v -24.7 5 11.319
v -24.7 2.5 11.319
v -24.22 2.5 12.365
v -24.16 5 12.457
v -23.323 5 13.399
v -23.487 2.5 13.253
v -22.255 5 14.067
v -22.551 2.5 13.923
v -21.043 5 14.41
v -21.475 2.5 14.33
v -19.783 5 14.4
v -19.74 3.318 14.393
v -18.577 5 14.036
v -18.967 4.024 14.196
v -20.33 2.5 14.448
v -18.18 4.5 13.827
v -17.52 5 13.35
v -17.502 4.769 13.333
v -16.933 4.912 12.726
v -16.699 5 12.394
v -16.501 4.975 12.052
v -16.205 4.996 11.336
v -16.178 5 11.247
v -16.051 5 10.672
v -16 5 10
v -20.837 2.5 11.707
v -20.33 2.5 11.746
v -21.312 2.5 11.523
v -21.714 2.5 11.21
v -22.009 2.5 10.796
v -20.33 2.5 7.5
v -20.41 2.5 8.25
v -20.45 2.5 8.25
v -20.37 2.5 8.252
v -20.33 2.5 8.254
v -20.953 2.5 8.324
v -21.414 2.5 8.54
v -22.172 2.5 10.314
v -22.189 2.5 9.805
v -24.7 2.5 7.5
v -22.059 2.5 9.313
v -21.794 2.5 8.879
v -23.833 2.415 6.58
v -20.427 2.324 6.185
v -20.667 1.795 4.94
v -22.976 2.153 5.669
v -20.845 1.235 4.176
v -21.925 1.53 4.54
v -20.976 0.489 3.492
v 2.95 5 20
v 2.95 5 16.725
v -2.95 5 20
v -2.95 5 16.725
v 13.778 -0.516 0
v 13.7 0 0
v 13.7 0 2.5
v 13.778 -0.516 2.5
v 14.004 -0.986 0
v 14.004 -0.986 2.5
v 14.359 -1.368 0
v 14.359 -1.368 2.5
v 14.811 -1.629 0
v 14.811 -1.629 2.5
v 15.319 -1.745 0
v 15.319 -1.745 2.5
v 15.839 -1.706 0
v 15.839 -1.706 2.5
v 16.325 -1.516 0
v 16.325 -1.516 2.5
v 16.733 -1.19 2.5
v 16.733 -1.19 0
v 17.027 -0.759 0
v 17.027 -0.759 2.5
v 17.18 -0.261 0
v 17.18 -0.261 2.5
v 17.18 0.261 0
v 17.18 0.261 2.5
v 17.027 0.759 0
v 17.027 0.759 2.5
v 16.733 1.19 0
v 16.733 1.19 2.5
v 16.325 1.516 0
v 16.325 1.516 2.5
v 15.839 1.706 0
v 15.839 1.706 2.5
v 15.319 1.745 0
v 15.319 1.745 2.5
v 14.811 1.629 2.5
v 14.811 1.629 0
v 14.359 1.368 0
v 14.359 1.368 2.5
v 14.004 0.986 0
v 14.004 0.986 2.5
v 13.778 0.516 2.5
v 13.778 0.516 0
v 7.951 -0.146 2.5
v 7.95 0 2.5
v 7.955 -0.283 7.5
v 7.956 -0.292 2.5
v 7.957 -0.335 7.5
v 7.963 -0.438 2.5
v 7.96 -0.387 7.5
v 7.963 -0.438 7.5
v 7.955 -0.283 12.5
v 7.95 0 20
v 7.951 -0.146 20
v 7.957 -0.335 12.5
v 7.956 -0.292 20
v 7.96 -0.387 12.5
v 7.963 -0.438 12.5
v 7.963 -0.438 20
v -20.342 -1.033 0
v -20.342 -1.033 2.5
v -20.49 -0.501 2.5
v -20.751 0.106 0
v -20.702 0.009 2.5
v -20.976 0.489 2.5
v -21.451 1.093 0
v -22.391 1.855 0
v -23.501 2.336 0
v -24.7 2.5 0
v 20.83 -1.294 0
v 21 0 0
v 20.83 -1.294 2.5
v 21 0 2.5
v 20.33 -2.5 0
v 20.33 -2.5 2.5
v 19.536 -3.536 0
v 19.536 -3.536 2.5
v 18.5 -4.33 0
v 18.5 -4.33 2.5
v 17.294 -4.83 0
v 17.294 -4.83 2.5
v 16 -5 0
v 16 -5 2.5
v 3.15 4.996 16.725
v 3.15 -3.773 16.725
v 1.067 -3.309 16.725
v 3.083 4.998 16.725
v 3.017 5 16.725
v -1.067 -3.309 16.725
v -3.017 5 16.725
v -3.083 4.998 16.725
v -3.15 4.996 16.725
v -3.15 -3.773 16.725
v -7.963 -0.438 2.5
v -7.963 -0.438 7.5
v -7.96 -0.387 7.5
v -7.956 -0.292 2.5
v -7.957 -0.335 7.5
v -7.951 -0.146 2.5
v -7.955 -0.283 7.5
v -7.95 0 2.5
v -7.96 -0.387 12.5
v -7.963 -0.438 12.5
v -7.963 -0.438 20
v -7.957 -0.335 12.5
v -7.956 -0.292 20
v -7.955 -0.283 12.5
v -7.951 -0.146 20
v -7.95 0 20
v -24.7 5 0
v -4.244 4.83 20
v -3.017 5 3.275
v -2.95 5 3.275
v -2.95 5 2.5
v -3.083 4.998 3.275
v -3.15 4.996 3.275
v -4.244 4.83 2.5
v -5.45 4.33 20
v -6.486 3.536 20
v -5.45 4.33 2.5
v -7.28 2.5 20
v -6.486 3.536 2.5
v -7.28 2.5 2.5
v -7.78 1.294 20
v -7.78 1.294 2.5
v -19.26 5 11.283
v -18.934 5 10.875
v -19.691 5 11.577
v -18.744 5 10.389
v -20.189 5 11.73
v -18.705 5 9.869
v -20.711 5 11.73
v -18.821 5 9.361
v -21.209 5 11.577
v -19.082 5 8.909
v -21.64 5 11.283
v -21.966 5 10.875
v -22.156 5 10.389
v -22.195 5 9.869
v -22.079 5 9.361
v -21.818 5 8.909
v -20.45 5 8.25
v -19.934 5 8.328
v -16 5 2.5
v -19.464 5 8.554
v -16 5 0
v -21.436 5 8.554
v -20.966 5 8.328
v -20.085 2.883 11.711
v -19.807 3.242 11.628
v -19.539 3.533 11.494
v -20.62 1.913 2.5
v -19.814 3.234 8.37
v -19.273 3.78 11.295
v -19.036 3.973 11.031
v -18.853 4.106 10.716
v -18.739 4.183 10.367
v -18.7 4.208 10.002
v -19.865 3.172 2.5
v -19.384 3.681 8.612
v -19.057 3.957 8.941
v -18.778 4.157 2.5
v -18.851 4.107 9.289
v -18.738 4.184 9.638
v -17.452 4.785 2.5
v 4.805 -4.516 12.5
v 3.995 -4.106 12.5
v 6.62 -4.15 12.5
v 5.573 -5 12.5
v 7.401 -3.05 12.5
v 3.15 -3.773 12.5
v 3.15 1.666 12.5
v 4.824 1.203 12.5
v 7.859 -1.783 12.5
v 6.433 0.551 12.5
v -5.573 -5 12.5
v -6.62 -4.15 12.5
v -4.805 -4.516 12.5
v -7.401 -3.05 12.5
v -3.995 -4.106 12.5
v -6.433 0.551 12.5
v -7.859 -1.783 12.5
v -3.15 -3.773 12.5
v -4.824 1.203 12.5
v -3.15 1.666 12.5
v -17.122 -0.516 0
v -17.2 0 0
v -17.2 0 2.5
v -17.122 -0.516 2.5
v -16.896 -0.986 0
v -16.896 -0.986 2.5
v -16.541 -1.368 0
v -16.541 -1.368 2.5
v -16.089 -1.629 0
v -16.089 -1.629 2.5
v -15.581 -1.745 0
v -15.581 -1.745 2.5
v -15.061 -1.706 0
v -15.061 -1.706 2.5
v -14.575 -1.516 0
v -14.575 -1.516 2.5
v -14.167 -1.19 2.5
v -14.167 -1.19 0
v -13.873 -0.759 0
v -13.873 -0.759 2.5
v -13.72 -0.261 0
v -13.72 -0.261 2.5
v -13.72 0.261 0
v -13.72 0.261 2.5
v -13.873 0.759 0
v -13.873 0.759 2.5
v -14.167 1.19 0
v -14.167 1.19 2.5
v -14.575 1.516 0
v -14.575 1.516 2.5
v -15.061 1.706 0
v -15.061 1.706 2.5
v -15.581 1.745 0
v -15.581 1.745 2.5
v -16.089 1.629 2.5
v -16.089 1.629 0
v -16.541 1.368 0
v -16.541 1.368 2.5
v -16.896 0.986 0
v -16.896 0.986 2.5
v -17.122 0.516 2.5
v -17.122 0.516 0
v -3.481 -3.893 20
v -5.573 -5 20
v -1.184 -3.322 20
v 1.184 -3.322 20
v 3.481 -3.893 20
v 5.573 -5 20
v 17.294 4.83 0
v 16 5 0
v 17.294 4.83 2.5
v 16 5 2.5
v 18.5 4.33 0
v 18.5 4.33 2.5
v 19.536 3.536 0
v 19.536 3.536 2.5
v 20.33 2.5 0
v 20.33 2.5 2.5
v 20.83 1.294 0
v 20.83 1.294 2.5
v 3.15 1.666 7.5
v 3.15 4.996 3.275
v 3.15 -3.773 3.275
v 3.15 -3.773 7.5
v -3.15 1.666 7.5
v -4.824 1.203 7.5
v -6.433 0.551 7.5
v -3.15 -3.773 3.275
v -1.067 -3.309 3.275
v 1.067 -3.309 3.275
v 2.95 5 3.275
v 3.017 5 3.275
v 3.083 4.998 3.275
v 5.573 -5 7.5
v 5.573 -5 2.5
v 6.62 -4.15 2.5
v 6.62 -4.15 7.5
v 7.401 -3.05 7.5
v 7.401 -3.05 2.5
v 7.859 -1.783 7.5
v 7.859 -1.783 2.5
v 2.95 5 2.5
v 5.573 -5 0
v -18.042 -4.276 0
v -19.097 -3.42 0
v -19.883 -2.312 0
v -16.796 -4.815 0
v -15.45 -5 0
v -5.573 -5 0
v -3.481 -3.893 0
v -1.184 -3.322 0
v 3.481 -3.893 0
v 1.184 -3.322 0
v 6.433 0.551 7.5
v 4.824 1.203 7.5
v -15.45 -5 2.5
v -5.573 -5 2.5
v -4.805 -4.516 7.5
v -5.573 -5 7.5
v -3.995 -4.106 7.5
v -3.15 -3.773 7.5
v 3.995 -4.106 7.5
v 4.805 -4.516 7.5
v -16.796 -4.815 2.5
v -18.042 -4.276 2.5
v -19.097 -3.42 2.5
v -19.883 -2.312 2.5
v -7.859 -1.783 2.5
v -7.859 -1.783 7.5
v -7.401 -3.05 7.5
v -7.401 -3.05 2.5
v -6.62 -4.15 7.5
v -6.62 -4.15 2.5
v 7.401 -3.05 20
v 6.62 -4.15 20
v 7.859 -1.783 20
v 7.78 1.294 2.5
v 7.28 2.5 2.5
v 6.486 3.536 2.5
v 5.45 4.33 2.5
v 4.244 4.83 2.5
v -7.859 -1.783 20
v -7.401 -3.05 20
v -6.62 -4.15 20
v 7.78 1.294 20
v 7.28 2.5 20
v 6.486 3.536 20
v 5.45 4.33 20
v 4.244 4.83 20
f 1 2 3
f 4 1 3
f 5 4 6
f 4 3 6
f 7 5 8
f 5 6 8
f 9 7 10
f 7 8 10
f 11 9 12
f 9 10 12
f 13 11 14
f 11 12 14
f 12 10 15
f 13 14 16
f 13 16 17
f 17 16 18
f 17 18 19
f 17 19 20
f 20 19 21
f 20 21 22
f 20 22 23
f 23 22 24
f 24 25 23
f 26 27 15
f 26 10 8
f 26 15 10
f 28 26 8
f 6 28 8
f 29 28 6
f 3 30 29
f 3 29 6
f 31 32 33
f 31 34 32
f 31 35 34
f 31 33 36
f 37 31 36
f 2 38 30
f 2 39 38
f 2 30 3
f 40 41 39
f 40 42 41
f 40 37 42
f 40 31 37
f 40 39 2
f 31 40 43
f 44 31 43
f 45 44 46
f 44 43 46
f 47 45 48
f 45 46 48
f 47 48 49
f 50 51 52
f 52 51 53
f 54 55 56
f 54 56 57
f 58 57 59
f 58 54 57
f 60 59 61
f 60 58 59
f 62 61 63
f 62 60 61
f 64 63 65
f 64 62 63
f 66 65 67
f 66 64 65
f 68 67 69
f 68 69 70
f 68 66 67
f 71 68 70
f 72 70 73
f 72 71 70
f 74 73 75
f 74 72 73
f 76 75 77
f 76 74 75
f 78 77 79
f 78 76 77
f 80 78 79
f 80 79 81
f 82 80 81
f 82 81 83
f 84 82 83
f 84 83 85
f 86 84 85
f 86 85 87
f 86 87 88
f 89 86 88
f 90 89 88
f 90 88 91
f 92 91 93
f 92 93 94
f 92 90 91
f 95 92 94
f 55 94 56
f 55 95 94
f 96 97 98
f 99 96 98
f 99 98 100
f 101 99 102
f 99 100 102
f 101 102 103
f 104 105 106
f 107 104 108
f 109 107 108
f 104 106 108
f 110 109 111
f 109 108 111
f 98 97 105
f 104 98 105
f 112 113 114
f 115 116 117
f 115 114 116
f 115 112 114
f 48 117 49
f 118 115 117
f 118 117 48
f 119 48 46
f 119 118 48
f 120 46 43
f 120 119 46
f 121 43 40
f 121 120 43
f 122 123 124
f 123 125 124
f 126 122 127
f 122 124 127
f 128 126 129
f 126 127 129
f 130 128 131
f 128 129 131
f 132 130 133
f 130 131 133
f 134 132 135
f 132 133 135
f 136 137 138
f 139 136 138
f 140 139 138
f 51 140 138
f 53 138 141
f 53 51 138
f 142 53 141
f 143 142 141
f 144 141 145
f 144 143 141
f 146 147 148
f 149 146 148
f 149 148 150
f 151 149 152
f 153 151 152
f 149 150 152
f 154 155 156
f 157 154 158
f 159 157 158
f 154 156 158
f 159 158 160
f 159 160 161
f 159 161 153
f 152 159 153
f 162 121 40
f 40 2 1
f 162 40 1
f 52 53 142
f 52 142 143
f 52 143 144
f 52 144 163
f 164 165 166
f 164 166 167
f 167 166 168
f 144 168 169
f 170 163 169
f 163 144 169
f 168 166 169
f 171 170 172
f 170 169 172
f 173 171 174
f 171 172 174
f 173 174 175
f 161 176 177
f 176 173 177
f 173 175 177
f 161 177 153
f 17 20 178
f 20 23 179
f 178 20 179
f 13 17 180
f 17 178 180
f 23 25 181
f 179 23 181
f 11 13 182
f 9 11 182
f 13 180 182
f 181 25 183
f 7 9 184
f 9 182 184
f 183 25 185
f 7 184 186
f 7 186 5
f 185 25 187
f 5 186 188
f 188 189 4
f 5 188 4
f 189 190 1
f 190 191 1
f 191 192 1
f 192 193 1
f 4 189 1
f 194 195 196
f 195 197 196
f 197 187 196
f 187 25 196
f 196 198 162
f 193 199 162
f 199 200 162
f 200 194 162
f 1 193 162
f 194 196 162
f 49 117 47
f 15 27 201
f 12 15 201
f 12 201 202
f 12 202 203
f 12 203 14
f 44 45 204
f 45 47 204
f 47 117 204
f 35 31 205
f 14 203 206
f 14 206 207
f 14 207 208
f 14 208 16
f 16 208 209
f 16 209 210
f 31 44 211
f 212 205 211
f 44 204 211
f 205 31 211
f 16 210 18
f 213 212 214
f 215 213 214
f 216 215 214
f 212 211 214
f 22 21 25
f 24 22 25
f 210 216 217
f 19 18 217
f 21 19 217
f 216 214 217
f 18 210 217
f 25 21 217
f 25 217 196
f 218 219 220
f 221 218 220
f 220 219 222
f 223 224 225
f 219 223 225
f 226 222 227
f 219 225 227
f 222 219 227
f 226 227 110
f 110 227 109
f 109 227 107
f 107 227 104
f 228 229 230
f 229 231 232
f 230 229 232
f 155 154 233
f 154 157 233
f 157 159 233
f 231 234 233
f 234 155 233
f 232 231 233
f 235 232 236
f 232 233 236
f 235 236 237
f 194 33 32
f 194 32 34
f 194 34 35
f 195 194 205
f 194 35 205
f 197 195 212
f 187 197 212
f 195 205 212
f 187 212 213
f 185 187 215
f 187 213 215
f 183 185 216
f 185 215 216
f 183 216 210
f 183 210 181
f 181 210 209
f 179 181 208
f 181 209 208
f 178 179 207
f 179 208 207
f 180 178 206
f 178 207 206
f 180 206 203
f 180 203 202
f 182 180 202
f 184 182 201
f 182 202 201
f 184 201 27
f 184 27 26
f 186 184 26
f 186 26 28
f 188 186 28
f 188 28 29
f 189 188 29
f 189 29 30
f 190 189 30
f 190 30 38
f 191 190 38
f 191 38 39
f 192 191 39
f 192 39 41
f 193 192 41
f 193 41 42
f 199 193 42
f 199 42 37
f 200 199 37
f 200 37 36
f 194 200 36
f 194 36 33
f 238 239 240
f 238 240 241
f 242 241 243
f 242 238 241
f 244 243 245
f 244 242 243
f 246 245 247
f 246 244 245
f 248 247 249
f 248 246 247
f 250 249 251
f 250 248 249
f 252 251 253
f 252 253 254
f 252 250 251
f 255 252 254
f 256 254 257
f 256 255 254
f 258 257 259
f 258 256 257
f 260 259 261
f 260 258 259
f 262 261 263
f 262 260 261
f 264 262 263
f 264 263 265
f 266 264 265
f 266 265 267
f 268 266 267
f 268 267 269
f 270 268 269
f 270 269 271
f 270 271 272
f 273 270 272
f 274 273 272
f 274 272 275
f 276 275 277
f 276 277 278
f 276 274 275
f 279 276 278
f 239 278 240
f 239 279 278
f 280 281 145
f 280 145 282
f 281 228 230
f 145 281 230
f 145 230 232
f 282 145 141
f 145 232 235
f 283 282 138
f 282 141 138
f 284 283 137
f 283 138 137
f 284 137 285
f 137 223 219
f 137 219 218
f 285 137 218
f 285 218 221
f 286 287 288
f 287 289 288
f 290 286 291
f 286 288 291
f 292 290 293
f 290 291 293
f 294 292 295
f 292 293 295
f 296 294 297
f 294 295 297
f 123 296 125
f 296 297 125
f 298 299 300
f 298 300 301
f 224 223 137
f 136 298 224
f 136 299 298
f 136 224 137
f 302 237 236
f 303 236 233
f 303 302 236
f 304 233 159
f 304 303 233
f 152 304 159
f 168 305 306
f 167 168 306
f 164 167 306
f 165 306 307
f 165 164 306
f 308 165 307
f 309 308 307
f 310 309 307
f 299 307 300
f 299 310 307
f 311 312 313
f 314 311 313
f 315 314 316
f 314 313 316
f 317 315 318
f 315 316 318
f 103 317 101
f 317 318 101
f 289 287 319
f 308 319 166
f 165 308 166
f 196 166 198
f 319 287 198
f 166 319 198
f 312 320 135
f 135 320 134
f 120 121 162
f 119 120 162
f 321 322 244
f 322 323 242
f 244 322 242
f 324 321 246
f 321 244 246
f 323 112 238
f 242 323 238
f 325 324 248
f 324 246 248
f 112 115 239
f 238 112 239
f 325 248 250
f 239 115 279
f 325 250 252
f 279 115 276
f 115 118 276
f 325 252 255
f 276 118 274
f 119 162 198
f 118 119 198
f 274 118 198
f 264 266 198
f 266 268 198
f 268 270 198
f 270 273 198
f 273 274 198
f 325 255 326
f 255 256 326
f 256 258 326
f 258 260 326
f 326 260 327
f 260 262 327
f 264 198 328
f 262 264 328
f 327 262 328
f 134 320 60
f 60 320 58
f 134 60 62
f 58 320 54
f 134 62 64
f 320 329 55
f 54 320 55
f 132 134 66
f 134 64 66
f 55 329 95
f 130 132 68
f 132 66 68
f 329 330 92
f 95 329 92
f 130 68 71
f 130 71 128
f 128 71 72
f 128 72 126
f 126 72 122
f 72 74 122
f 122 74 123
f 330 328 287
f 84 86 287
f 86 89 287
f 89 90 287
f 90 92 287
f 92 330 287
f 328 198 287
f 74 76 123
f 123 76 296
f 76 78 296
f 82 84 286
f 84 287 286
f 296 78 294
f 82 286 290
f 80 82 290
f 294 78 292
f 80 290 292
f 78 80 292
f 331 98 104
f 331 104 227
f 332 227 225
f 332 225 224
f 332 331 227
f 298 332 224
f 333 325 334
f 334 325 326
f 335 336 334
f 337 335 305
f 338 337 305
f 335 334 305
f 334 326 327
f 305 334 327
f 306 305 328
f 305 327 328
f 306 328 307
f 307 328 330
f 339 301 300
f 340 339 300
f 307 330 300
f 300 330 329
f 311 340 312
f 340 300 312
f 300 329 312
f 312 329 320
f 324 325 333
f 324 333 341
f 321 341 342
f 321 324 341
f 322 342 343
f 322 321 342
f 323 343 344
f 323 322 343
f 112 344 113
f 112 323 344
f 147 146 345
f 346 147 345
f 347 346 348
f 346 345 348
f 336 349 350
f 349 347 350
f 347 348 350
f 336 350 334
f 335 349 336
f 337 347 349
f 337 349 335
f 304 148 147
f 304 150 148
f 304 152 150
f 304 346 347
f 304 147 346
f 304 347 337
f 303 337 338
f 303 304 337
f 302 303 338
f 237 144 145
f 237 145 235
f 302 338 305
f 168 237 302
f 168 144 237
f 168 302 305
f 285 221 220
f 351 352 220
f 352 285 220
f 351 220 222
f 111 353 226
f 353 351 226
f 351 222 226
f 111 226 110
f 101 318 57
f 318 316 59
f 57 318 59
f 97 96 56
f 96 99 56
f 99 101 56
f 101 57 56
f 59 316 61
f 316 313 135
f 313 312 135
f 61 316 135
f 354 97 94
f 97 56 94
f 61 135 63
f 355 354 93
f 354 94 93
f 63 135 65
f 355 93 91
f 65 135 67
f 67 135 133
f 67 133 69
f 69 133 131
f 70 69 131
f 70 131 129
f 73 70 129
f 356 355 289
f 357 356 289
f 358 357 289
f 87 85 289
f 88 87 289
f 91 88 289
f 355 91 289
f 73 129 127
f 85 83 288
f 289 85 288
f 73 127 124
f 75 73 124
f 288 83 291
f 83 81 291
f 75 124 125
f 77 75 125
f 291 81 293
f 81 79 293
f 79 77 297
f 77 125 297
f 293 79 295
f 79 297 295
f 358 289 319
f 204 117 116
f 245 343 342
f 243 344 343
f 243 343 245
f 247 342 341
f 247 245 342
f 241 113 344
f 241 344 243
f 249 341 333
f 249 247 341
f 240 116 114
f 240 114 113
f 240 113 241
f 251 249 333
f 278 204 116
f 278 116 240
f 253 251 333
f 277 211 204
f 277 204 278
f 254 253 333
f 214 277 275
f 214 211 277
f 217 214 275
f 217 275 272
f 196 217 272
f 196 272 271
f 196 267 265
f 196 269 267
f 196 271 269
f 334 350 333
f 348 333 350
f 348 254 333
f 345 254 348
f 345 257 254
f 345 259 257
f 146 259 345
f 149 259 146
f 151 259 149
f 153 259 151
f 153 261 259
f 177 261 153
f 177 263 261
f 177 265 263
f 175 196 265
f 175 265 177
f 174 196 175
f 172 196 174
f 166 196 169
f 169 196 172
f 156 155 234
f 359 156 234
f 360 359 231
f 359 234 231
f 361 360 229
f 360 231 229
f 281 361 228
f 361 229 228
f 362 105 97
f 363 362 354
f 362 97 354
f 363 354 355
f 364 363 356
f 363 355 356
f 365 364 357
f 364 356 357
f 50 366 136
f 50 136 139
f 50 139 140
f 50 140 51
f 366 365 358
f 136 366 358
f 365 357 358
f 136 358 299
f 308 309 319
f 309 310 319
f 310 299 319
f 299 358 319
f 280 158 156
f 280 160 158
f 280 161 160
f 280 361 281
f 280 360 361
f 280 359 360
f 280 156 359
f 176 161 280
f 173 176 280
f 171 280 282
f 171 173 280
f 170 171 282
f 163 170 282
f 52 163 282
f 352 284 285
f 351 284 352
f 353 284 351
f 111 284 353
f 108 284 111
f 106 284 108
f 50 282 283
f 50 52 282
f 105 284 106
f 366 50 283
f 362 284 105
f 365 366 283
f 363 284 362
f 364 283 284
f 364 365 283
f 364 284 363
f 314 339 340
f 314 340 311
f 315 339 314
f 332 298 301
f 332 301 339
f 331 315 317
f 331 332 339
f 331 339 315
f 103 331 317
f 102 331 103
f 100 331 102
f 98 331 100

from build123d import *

# Parameters (mm, degrees)
SKETCH2_R               = 2.8000000000000056
BOSS_EXTRUDE1_DEPTH     = 20
CUT_EXTRUDE1_DEPTH      = 31.675723300355934
SKETCH4_R               = 7.499999999999999
CUT_EXTRUDE2_DEPTH      = 17.5
CUT_EXTRUDE3_DEPTH      = 2.5
CUT_EXTRUDE3_DEPTH_BACK = 2.5
SKETCH6_R               = 15
FILLET1_R               = 5
FILLET2_R               = 5
BOSS_EXTRUDE2_DEPTH     = 20
SKETCH8_R               = 1.7500000000000004
CUT_EXTRUDE4_DEPTH      = 39.87211487346831
CUT_EXTRUDE5_DEPTH      = 20
CUT_EXTRUDE6_DEPTH      = 31.68126471480597
CUT_EXTRUDE7_DEPTH      = 33.654861873847
FILLET4_R               = 5
CUT_EXTRUDE9_DEPTH      = 31.681264738273054
CUT_EXTRUDE9_DEPTH_BACK = 31.681264738273054
SKETCH13_R              = 2.8000000000000056
SKETCH13_R_2            = 1.75
SKETCH13_R_3            = 1.7500000000000002
BOSS_EXTRUDE3_DEPTH     = 2.5


# Some blends are built 0.0001 mm under size
with BuildPart() as part:
    # Sketch2 → Boss-Extrude1 (new body)
    with BuildSketch(Plane.XY):
        with BuildLine():
            Line((21, 5), (-21, 5))
            Line((-21, 5), (-21, -5))
            Line((-21, -5), (-5.57337420240183, -5))
            ThreePointArc((-5.5733742024018555, -4.999999999999908), (5.415e-14, -3.25), (5.573374202401943, -4.999999999999966))
            Line((5.573374202401933, -5), (21, -5))
            Line((21, -5), (21, 5))
        make_face()
        with Locations((-15.45, 0)):
            Circle(SKETCH2_R, mode=Mode.SUBTRACT)
        with Locations((15.45, 0)):
            Circle(SKETCH2_R, mode=Mode.SUBTRACT)
    extrude(amount=BOSS_EXTRUDE1_DEPTH)

    # Sketch3 → Cut-Extrude1 (cut, through all)
    with BuildSketch(Plane(origin=(0, 5, 0), x_dir=(1, 0, 0), z_dir=(0, 1, 0))):
        Polygon((-3.1499999999999995, -3.2750000000000004), (3.1500000000000004, -3.275), (3.1499999999999964, -16.725), (-3.1499999999999924, -16.725), align=None)
    extrude(amount=-CUT_EXTRUDE1_DEPTH, mode=Mode.SUBTRACT)

    # Sketch4 → Cut-Extrude2 (cut)
    with BuildSketch(Plane.XY.offset(20)):
        with Locations((-15.45, 0)):
            Circle(SKETCH4_R)
        with Locations((15.45, 0)):
            Circle(SKETCH4_R)
    extrude(amount=-CUT_EXTRUDE2_DEPTH, mode=Mode.SUBTRACT)

    # Sketch6 → Cut-Extrude3 (cut, two sides: drawn at the far end of the back side and taken through both)
    with BuildSketch(Plane.XY.offset(10.000000000000002).offset(-CUT_EXTRUDE3_DEPTH_BACK)):
        with Locations((1.63e-15, -13)):
            Circle(SKETCH6_R)
    extrude(amount=CUT_EXTRUDE3_DEPTH + CUT_EXTRUDE3_DEPTH_BACK, mode=Mode.SUBTRACT)

    # Fillet1
    fillet1_edges = [part.edges().sort_by_distance(p)[0] for p in [
        (21, -5, 1.25),
        (21, 5, 1.25),
        (-21, -5, 1.25),
        (-21, 5, 1.25),
    ]]
    fillet(fillet1_edges, radius=FILLET1_R - 0.0001)  # a hair under: the kernel refuses the full size

    # Fillet2
    # the kernel refuses this fillet: 5 mm, written as the material it takes off along each edge
    with BuildSketch(Plane(origin=(9.859830056250527, -5, 0.14880111239423144), x_dir=(-0.38397397843956865, 0.9233439141951876, 0), z_dir=(0, 0, 1))) as fillet2_piece_1_section:
        with BuildLine():
            CenterArc((6.587306073389745, 4.721012859383849), FILLET2_R, 188.77925307578494, 61.9904903791857)
            Line((1.6458875076078383, 3.957872926117424), (0, 0))
            ThreePointArc((0, 0), (2.470239777521158, 0.41848071092422756), (4.940479555042308, 8e-17))
        make_face()
    fillet2_piece_1 = extrude(amount=32.20239777521154, mode=Mode.PRIVATE)
    fillet2_piece_1 = split(fillet2_piece_1, bisect_by=Plane(origin=(9.859830056250527, -5, 2.5), z_dir=(0, 0, 1)), keep=Keep.TOP, mode=Mode.PRIVATE)
    add(fillet2_piece_1, mode=Mode.SUBTRACT)
    with BuildSketch(Plane(origin=(9.859830056250527, -5, 2.5), x_dir=(-1, 4.35e-15, 0), z_dir=(0, 0, 1))) as fillet2_piece_2:
        with BuildLine():
            CenterArc((6.888472612747909, -4.269602883923407), FILLET2_R, 121.35931142653445, 61.990490379185644)
            ThreePointArc((1.8970155901489643, -4.561761730354054), (1.334909412714444, -2.120195161703234), (0, 0))
            Line((0, 0), (4.286455853848589, 0))
        make_face()
    extrude(amount=17.35119888760577, mode=Mode.SUBTRACT)
    with BuildSketch(Plane(origin=(9.859830056250527, 5, 2.5), x_dir=(-0.3568220897730901, -0.9341723589627157, 0), z_dir=(0, 0, 1))) as fillet2_piece_3:
        with BuildLine():
            CenterArc((7.136441795461798, -4.670861794813579), FILLET2_R, 110.90515744788931, 90.00000000000068)
            Line((2.4655800006482402, -6.454972243679084), (0, 0))
            ThreePointArc((0, 0), (2.6761656732981733, -0.49370730777963273), (5.3523313465963485, -4e-17))
        make_face()
    extrude(amount=34.77457514062646, mode=Mode.SUBTRACT)
    with BuildSketch(Plane(origin=(-9.859830056250527, -5, 2.5), x_dir=(1, 1.077e-14, 0), z_dir=(0, 0, 1))) as fillet2_piece_4:
        with BuildLine():
            CenterArc((6.88847261274794, 4.2696028839234454), FILLET2_R, 176.65019819427988, 61.9904903791865)
            ThreePointArc((1.8970155901489953, 4.561761730354092), (1.3349094127144647, 2.1201951617032417), (0, 0))
            Line((0, 0), (4.286455853848682, 0))
        make_face()
    extrude(amount=17.351198887605886, mode=Mode.SUBTRACT)
    with BuildSketch(Plane(origin=(-9.859830056250527, -5, 0.14880111239411775), x_dir=(0.3839739784395653, 0.9233439141951888, 0), z_dir=(0, 0, 1))) as fillet2_piece_5_section:
        with BuildLine():
            CenterArc((6.587306073389805, -4.721012859383843), FILLET2_R, 109.23025654502955, 61.99049037918651)
            Line((1.645887507607885, -3.957872926117504), (0, 0))
            ThreePointArc((0, 0), (2.4702397775211735, -0.4184807109242367), (4.940479555042354, -1.7e-16))
        make_face()
    fillet2_piece_5 = extrude(amount=32.20239777521177, mode=Mode.PRIVATE)
    fillet2_piece_5 = split(fillet2_piece_5, bisect_by=Plane(origin=(-9.859830056250527, -5, 2.5), z_dir=(0, 0, 1)), keep=Keep.TOP, mode=Mode.PRIVATE)
    add(fillet2_piece_5, mode=Mode.SUBTRACT)
    with BuildSketch(Plane(origin=(-9.859830056250527, 5, 2.5), x_dir=(1, 0, 0), z_dir=(0, 0, 1))) as fillet2_piece_6:
        with BuildLine():
            CenterArc((6.909830056250634, -5), FILLET2_R, 90, 90)
            ThreePointArc((1.9098300562506338, -5.000000000000002), (1.416122748470901, -2.3238343267018453), (0, 0))
            Line((0, 0), (6.909830056250634, 0))
        make_face()
    extrude(amount=34.77457514062658, mode=Mode.SUBTRACT)

    # Sketch7 → Boss-Extrude2 (add)
    with BuildSketch(Plane(origin=(0, 0, 0), x_dir=(-1, 0, 0), z_dir=(0, 0, -1))):
        with BuildLine():
            Line((15.999999999999982, 5.000000000000001), (31.796875864400832, 5))
            Line((31.796875864400832, 5), (31.796875864400825, -4.999999999999998))
            Line((31.796875864400825, -4.999999999999998), (16, -5))
            ThreePointArc((16, -5), (19.53553390593274, -3.5355339059327413), (21, 0))
            ThreePointArc((21, 0), (19.535533905932727, 3.53553390593274), (15.999999999999982, 5.000000000000001))
        make_face()
    extrude(amount=-BOSS_EXTRUDE2_DEPTH)

    # Sketch8 → Cut-Extrude4 (cut, through all)
    with BuildSketch(Plane.XZ.offset(5)):
        with Locations(Location((-20.449999999999953, 10.000000000000002, 0), (0, 0, 270))):
            Circle(SKETCH8_R)
    extrude(amount=-CUT_EXTRUDE4_DEPTH, mode=Mode.SUBTRACT)

    # Sketch9 → Cut-Extrude5 (cut)
    with BuildSketch(Plane.XY.offset(20)):
        Polygon((-31.796875864400832, 5), (-31.796875864400825, -4.999999999999998), (-24.69999999999995, -4.999999999999998), (-24.69999999999995, 5), align=None)
    extrude(amount=-CUT_EXTRUDE5_DEPTH, mode=Mode.SUBTRACT)

    # Sketch10 → Cut-Extrude6 (cut, through all)
    with BuildSketch(Plane.XY.offset(2.5)):
        Polygon((-24.69999999999995, -4.999999999999999), (-15.999999999999948, -4.999999999999999), (-15.999999999999982, 2.5000000000000004), (-24.69999999999995, 2.5000000000000004), align=None)
    extrude(amount=CUT_EXTRUDE6_DEPTH, mode=Mode.SUBTRACT)

    # Sketch11 → Cut-Extrude7 (cut, through all)
    with BuildSketch(Plane.XZ.offset(-2.5000000000000004)):
        with BuildLine():
            Line((-20.330127018922187, 20), (-20.330127018922184, 14.448385152884956))
            ThreePointArc((-20.330127018922198, 14.448385152884956), (-17.261274959658927, 13.103954351645958), (-15.99999999999998, 10.000000000000002))
            Line((-15.999999999999982, 10.000000000000002), (-15.999999999999982, 20))
            Line((-15.999999999999982, 20), (-20.330127018922187, 20))
        make_face()
        with BuildLine():
            Line((-24.69999999999995, 20), (-24.69999999999995, 11.31909059582739))
            ThreePointArc((-24.699999999999896, 11.319090595827381), (-23.040870202135775, 13.61799552178889), (-20.330127018922198, 14.448385152884956))
            Line((-20.330127018922184, 14.448385152884956), (-20.330127018922187, 20))
            Line((-20.330127018922187, 20), (-24.69999999999995, 20))
        make_face()
    extrude(amount=-CUT_EXTRUDE7_DEPTH, mode=Mode.SUBTRACT)

    # Fillet4
    fillet4_edges = [part.edges().sort_by_distance(p)[0] for p in [
        (-22.51506350946113, 2.5000000000000004, 2.5),
    ]]
    fillet(fillet4_edges, radius=FILLET4_R)

    # Sketch12 → Cut-Extrude9 (cut, two sides: drawn at the far end of the back side and taken through both)
    with BuildSketch(Plane.XY.offset(2.5).offset(-CUT_EXTRUDE9_DEPTH_BACK)):
        with BuildLine():
            Line((-24.69999999999995, -4.999999999999999), (-21.45000000000008, -4.999999999999999))
            ThreePointArc((-21.45000000000008, -5), (-20.557799958891973, -3.5917806364070426), (-20.245833333333337, -1.9541666666666095))
            ThreePointArc((-20.245833333333337, -1.9541666666666084), (-20.269945987618247, -1.4913252879797767), (-20.34202288251563, -1.0334950976871942))
            ThreePointArc((-20.34202288251563, -1.0334950976871942), (-20.587884121097368, -0.2424121010465221), (-20.975985161662212, 0.4894605917924846))
            ThreePointArc((-20.975985161662173, 0.4894605917924937), (-20.887243562262398, -1.0558647466057054), (-20.330127018922195, -2.499999999999999))
            Line((-20.330127018922195, -2.4999999999999996), (-24.69999999999995, -2.4999999999999996))
            Line((-24.69999999999995, -2.4999999999999996), (-24.69999999999995, -4.999999999999999))
        make_face()
        with BuildLine():
            ThreePointArc((-20.975985161662212, 0.4894605917924846), (-29.137653111561168, -1.570975388197232), (-21.45000000000008, -5))
            Line((-21.45000000000008, -4.999999999999999), (-24.69999999999995, -4.999999999999999))
            Line((-24.69999999999995, -4.999999999999999), (-24.69999999999995, -2.4999999999999996))
            Line((-24.69999999999995, -2.4999999999999996), (-20.330127018922195, -2.4999999999999996))
            ThreePointArc((-20.330127018922195, -2.499999999999999), (-20.887243562262398, -1.0558647466057054), (-20.975985161662173, 0.4894605917924937))
        make_face()
        with BuildLine():
            Line((-21.45000000000008, -4.999999999999999), (-15.45, -5))
            ThreePointArc((-15.450000000000001, -5), (-18.59900972621267, -3.8837787970246174), (-20.34202288251563, -1.0334950976871942))
            ThreePointArc((-20.34202288251563, -1.0334950976871942), (-20.269945987618247, -1.4913252879797767), (-20.245833333333337, -1.9541666666666084))
            ThreePointArc((-20.245833333333337, -1.9541666666666095), (-20.557799958891973, -3.5917806364070426), (-21.45000000000008, -5))
        make_face()
    extrude(amount=CUT_EXTRUDE9_DEPTH + CUT_EXTRUDE9_DEPTH_BACK, mode=Mode.SUBTRACT)

    # Sketch13 → Boss-Extrude3 (add)
    # profile 1 of 2: a face of its own
    with BuildSketch(Plane.XY):
        with Locations((-15.45, 0)):
            Circle(SKETCH13_R)
        with Locations(Location((-15.45, 0, 0), (0, 0, 180))):
            Circle(SKETCH13_R_2, mode=Mode.SUBTRACT)
    # profile 2 of 2: a face of its own
    with BuildSketch(Plane.XY):
        with Locations((15.45, 0)):
            Circle(SKETCH13_R)
        with Locations(Location((15.45, 0, 0), (0, 0, 180))):
            Circle(SKETCH13_R_3, mode=Mode.SUBTRACT)
    extrude(amount=BOSS_EXTRUDE3_DEPTH)


solid = part.part
